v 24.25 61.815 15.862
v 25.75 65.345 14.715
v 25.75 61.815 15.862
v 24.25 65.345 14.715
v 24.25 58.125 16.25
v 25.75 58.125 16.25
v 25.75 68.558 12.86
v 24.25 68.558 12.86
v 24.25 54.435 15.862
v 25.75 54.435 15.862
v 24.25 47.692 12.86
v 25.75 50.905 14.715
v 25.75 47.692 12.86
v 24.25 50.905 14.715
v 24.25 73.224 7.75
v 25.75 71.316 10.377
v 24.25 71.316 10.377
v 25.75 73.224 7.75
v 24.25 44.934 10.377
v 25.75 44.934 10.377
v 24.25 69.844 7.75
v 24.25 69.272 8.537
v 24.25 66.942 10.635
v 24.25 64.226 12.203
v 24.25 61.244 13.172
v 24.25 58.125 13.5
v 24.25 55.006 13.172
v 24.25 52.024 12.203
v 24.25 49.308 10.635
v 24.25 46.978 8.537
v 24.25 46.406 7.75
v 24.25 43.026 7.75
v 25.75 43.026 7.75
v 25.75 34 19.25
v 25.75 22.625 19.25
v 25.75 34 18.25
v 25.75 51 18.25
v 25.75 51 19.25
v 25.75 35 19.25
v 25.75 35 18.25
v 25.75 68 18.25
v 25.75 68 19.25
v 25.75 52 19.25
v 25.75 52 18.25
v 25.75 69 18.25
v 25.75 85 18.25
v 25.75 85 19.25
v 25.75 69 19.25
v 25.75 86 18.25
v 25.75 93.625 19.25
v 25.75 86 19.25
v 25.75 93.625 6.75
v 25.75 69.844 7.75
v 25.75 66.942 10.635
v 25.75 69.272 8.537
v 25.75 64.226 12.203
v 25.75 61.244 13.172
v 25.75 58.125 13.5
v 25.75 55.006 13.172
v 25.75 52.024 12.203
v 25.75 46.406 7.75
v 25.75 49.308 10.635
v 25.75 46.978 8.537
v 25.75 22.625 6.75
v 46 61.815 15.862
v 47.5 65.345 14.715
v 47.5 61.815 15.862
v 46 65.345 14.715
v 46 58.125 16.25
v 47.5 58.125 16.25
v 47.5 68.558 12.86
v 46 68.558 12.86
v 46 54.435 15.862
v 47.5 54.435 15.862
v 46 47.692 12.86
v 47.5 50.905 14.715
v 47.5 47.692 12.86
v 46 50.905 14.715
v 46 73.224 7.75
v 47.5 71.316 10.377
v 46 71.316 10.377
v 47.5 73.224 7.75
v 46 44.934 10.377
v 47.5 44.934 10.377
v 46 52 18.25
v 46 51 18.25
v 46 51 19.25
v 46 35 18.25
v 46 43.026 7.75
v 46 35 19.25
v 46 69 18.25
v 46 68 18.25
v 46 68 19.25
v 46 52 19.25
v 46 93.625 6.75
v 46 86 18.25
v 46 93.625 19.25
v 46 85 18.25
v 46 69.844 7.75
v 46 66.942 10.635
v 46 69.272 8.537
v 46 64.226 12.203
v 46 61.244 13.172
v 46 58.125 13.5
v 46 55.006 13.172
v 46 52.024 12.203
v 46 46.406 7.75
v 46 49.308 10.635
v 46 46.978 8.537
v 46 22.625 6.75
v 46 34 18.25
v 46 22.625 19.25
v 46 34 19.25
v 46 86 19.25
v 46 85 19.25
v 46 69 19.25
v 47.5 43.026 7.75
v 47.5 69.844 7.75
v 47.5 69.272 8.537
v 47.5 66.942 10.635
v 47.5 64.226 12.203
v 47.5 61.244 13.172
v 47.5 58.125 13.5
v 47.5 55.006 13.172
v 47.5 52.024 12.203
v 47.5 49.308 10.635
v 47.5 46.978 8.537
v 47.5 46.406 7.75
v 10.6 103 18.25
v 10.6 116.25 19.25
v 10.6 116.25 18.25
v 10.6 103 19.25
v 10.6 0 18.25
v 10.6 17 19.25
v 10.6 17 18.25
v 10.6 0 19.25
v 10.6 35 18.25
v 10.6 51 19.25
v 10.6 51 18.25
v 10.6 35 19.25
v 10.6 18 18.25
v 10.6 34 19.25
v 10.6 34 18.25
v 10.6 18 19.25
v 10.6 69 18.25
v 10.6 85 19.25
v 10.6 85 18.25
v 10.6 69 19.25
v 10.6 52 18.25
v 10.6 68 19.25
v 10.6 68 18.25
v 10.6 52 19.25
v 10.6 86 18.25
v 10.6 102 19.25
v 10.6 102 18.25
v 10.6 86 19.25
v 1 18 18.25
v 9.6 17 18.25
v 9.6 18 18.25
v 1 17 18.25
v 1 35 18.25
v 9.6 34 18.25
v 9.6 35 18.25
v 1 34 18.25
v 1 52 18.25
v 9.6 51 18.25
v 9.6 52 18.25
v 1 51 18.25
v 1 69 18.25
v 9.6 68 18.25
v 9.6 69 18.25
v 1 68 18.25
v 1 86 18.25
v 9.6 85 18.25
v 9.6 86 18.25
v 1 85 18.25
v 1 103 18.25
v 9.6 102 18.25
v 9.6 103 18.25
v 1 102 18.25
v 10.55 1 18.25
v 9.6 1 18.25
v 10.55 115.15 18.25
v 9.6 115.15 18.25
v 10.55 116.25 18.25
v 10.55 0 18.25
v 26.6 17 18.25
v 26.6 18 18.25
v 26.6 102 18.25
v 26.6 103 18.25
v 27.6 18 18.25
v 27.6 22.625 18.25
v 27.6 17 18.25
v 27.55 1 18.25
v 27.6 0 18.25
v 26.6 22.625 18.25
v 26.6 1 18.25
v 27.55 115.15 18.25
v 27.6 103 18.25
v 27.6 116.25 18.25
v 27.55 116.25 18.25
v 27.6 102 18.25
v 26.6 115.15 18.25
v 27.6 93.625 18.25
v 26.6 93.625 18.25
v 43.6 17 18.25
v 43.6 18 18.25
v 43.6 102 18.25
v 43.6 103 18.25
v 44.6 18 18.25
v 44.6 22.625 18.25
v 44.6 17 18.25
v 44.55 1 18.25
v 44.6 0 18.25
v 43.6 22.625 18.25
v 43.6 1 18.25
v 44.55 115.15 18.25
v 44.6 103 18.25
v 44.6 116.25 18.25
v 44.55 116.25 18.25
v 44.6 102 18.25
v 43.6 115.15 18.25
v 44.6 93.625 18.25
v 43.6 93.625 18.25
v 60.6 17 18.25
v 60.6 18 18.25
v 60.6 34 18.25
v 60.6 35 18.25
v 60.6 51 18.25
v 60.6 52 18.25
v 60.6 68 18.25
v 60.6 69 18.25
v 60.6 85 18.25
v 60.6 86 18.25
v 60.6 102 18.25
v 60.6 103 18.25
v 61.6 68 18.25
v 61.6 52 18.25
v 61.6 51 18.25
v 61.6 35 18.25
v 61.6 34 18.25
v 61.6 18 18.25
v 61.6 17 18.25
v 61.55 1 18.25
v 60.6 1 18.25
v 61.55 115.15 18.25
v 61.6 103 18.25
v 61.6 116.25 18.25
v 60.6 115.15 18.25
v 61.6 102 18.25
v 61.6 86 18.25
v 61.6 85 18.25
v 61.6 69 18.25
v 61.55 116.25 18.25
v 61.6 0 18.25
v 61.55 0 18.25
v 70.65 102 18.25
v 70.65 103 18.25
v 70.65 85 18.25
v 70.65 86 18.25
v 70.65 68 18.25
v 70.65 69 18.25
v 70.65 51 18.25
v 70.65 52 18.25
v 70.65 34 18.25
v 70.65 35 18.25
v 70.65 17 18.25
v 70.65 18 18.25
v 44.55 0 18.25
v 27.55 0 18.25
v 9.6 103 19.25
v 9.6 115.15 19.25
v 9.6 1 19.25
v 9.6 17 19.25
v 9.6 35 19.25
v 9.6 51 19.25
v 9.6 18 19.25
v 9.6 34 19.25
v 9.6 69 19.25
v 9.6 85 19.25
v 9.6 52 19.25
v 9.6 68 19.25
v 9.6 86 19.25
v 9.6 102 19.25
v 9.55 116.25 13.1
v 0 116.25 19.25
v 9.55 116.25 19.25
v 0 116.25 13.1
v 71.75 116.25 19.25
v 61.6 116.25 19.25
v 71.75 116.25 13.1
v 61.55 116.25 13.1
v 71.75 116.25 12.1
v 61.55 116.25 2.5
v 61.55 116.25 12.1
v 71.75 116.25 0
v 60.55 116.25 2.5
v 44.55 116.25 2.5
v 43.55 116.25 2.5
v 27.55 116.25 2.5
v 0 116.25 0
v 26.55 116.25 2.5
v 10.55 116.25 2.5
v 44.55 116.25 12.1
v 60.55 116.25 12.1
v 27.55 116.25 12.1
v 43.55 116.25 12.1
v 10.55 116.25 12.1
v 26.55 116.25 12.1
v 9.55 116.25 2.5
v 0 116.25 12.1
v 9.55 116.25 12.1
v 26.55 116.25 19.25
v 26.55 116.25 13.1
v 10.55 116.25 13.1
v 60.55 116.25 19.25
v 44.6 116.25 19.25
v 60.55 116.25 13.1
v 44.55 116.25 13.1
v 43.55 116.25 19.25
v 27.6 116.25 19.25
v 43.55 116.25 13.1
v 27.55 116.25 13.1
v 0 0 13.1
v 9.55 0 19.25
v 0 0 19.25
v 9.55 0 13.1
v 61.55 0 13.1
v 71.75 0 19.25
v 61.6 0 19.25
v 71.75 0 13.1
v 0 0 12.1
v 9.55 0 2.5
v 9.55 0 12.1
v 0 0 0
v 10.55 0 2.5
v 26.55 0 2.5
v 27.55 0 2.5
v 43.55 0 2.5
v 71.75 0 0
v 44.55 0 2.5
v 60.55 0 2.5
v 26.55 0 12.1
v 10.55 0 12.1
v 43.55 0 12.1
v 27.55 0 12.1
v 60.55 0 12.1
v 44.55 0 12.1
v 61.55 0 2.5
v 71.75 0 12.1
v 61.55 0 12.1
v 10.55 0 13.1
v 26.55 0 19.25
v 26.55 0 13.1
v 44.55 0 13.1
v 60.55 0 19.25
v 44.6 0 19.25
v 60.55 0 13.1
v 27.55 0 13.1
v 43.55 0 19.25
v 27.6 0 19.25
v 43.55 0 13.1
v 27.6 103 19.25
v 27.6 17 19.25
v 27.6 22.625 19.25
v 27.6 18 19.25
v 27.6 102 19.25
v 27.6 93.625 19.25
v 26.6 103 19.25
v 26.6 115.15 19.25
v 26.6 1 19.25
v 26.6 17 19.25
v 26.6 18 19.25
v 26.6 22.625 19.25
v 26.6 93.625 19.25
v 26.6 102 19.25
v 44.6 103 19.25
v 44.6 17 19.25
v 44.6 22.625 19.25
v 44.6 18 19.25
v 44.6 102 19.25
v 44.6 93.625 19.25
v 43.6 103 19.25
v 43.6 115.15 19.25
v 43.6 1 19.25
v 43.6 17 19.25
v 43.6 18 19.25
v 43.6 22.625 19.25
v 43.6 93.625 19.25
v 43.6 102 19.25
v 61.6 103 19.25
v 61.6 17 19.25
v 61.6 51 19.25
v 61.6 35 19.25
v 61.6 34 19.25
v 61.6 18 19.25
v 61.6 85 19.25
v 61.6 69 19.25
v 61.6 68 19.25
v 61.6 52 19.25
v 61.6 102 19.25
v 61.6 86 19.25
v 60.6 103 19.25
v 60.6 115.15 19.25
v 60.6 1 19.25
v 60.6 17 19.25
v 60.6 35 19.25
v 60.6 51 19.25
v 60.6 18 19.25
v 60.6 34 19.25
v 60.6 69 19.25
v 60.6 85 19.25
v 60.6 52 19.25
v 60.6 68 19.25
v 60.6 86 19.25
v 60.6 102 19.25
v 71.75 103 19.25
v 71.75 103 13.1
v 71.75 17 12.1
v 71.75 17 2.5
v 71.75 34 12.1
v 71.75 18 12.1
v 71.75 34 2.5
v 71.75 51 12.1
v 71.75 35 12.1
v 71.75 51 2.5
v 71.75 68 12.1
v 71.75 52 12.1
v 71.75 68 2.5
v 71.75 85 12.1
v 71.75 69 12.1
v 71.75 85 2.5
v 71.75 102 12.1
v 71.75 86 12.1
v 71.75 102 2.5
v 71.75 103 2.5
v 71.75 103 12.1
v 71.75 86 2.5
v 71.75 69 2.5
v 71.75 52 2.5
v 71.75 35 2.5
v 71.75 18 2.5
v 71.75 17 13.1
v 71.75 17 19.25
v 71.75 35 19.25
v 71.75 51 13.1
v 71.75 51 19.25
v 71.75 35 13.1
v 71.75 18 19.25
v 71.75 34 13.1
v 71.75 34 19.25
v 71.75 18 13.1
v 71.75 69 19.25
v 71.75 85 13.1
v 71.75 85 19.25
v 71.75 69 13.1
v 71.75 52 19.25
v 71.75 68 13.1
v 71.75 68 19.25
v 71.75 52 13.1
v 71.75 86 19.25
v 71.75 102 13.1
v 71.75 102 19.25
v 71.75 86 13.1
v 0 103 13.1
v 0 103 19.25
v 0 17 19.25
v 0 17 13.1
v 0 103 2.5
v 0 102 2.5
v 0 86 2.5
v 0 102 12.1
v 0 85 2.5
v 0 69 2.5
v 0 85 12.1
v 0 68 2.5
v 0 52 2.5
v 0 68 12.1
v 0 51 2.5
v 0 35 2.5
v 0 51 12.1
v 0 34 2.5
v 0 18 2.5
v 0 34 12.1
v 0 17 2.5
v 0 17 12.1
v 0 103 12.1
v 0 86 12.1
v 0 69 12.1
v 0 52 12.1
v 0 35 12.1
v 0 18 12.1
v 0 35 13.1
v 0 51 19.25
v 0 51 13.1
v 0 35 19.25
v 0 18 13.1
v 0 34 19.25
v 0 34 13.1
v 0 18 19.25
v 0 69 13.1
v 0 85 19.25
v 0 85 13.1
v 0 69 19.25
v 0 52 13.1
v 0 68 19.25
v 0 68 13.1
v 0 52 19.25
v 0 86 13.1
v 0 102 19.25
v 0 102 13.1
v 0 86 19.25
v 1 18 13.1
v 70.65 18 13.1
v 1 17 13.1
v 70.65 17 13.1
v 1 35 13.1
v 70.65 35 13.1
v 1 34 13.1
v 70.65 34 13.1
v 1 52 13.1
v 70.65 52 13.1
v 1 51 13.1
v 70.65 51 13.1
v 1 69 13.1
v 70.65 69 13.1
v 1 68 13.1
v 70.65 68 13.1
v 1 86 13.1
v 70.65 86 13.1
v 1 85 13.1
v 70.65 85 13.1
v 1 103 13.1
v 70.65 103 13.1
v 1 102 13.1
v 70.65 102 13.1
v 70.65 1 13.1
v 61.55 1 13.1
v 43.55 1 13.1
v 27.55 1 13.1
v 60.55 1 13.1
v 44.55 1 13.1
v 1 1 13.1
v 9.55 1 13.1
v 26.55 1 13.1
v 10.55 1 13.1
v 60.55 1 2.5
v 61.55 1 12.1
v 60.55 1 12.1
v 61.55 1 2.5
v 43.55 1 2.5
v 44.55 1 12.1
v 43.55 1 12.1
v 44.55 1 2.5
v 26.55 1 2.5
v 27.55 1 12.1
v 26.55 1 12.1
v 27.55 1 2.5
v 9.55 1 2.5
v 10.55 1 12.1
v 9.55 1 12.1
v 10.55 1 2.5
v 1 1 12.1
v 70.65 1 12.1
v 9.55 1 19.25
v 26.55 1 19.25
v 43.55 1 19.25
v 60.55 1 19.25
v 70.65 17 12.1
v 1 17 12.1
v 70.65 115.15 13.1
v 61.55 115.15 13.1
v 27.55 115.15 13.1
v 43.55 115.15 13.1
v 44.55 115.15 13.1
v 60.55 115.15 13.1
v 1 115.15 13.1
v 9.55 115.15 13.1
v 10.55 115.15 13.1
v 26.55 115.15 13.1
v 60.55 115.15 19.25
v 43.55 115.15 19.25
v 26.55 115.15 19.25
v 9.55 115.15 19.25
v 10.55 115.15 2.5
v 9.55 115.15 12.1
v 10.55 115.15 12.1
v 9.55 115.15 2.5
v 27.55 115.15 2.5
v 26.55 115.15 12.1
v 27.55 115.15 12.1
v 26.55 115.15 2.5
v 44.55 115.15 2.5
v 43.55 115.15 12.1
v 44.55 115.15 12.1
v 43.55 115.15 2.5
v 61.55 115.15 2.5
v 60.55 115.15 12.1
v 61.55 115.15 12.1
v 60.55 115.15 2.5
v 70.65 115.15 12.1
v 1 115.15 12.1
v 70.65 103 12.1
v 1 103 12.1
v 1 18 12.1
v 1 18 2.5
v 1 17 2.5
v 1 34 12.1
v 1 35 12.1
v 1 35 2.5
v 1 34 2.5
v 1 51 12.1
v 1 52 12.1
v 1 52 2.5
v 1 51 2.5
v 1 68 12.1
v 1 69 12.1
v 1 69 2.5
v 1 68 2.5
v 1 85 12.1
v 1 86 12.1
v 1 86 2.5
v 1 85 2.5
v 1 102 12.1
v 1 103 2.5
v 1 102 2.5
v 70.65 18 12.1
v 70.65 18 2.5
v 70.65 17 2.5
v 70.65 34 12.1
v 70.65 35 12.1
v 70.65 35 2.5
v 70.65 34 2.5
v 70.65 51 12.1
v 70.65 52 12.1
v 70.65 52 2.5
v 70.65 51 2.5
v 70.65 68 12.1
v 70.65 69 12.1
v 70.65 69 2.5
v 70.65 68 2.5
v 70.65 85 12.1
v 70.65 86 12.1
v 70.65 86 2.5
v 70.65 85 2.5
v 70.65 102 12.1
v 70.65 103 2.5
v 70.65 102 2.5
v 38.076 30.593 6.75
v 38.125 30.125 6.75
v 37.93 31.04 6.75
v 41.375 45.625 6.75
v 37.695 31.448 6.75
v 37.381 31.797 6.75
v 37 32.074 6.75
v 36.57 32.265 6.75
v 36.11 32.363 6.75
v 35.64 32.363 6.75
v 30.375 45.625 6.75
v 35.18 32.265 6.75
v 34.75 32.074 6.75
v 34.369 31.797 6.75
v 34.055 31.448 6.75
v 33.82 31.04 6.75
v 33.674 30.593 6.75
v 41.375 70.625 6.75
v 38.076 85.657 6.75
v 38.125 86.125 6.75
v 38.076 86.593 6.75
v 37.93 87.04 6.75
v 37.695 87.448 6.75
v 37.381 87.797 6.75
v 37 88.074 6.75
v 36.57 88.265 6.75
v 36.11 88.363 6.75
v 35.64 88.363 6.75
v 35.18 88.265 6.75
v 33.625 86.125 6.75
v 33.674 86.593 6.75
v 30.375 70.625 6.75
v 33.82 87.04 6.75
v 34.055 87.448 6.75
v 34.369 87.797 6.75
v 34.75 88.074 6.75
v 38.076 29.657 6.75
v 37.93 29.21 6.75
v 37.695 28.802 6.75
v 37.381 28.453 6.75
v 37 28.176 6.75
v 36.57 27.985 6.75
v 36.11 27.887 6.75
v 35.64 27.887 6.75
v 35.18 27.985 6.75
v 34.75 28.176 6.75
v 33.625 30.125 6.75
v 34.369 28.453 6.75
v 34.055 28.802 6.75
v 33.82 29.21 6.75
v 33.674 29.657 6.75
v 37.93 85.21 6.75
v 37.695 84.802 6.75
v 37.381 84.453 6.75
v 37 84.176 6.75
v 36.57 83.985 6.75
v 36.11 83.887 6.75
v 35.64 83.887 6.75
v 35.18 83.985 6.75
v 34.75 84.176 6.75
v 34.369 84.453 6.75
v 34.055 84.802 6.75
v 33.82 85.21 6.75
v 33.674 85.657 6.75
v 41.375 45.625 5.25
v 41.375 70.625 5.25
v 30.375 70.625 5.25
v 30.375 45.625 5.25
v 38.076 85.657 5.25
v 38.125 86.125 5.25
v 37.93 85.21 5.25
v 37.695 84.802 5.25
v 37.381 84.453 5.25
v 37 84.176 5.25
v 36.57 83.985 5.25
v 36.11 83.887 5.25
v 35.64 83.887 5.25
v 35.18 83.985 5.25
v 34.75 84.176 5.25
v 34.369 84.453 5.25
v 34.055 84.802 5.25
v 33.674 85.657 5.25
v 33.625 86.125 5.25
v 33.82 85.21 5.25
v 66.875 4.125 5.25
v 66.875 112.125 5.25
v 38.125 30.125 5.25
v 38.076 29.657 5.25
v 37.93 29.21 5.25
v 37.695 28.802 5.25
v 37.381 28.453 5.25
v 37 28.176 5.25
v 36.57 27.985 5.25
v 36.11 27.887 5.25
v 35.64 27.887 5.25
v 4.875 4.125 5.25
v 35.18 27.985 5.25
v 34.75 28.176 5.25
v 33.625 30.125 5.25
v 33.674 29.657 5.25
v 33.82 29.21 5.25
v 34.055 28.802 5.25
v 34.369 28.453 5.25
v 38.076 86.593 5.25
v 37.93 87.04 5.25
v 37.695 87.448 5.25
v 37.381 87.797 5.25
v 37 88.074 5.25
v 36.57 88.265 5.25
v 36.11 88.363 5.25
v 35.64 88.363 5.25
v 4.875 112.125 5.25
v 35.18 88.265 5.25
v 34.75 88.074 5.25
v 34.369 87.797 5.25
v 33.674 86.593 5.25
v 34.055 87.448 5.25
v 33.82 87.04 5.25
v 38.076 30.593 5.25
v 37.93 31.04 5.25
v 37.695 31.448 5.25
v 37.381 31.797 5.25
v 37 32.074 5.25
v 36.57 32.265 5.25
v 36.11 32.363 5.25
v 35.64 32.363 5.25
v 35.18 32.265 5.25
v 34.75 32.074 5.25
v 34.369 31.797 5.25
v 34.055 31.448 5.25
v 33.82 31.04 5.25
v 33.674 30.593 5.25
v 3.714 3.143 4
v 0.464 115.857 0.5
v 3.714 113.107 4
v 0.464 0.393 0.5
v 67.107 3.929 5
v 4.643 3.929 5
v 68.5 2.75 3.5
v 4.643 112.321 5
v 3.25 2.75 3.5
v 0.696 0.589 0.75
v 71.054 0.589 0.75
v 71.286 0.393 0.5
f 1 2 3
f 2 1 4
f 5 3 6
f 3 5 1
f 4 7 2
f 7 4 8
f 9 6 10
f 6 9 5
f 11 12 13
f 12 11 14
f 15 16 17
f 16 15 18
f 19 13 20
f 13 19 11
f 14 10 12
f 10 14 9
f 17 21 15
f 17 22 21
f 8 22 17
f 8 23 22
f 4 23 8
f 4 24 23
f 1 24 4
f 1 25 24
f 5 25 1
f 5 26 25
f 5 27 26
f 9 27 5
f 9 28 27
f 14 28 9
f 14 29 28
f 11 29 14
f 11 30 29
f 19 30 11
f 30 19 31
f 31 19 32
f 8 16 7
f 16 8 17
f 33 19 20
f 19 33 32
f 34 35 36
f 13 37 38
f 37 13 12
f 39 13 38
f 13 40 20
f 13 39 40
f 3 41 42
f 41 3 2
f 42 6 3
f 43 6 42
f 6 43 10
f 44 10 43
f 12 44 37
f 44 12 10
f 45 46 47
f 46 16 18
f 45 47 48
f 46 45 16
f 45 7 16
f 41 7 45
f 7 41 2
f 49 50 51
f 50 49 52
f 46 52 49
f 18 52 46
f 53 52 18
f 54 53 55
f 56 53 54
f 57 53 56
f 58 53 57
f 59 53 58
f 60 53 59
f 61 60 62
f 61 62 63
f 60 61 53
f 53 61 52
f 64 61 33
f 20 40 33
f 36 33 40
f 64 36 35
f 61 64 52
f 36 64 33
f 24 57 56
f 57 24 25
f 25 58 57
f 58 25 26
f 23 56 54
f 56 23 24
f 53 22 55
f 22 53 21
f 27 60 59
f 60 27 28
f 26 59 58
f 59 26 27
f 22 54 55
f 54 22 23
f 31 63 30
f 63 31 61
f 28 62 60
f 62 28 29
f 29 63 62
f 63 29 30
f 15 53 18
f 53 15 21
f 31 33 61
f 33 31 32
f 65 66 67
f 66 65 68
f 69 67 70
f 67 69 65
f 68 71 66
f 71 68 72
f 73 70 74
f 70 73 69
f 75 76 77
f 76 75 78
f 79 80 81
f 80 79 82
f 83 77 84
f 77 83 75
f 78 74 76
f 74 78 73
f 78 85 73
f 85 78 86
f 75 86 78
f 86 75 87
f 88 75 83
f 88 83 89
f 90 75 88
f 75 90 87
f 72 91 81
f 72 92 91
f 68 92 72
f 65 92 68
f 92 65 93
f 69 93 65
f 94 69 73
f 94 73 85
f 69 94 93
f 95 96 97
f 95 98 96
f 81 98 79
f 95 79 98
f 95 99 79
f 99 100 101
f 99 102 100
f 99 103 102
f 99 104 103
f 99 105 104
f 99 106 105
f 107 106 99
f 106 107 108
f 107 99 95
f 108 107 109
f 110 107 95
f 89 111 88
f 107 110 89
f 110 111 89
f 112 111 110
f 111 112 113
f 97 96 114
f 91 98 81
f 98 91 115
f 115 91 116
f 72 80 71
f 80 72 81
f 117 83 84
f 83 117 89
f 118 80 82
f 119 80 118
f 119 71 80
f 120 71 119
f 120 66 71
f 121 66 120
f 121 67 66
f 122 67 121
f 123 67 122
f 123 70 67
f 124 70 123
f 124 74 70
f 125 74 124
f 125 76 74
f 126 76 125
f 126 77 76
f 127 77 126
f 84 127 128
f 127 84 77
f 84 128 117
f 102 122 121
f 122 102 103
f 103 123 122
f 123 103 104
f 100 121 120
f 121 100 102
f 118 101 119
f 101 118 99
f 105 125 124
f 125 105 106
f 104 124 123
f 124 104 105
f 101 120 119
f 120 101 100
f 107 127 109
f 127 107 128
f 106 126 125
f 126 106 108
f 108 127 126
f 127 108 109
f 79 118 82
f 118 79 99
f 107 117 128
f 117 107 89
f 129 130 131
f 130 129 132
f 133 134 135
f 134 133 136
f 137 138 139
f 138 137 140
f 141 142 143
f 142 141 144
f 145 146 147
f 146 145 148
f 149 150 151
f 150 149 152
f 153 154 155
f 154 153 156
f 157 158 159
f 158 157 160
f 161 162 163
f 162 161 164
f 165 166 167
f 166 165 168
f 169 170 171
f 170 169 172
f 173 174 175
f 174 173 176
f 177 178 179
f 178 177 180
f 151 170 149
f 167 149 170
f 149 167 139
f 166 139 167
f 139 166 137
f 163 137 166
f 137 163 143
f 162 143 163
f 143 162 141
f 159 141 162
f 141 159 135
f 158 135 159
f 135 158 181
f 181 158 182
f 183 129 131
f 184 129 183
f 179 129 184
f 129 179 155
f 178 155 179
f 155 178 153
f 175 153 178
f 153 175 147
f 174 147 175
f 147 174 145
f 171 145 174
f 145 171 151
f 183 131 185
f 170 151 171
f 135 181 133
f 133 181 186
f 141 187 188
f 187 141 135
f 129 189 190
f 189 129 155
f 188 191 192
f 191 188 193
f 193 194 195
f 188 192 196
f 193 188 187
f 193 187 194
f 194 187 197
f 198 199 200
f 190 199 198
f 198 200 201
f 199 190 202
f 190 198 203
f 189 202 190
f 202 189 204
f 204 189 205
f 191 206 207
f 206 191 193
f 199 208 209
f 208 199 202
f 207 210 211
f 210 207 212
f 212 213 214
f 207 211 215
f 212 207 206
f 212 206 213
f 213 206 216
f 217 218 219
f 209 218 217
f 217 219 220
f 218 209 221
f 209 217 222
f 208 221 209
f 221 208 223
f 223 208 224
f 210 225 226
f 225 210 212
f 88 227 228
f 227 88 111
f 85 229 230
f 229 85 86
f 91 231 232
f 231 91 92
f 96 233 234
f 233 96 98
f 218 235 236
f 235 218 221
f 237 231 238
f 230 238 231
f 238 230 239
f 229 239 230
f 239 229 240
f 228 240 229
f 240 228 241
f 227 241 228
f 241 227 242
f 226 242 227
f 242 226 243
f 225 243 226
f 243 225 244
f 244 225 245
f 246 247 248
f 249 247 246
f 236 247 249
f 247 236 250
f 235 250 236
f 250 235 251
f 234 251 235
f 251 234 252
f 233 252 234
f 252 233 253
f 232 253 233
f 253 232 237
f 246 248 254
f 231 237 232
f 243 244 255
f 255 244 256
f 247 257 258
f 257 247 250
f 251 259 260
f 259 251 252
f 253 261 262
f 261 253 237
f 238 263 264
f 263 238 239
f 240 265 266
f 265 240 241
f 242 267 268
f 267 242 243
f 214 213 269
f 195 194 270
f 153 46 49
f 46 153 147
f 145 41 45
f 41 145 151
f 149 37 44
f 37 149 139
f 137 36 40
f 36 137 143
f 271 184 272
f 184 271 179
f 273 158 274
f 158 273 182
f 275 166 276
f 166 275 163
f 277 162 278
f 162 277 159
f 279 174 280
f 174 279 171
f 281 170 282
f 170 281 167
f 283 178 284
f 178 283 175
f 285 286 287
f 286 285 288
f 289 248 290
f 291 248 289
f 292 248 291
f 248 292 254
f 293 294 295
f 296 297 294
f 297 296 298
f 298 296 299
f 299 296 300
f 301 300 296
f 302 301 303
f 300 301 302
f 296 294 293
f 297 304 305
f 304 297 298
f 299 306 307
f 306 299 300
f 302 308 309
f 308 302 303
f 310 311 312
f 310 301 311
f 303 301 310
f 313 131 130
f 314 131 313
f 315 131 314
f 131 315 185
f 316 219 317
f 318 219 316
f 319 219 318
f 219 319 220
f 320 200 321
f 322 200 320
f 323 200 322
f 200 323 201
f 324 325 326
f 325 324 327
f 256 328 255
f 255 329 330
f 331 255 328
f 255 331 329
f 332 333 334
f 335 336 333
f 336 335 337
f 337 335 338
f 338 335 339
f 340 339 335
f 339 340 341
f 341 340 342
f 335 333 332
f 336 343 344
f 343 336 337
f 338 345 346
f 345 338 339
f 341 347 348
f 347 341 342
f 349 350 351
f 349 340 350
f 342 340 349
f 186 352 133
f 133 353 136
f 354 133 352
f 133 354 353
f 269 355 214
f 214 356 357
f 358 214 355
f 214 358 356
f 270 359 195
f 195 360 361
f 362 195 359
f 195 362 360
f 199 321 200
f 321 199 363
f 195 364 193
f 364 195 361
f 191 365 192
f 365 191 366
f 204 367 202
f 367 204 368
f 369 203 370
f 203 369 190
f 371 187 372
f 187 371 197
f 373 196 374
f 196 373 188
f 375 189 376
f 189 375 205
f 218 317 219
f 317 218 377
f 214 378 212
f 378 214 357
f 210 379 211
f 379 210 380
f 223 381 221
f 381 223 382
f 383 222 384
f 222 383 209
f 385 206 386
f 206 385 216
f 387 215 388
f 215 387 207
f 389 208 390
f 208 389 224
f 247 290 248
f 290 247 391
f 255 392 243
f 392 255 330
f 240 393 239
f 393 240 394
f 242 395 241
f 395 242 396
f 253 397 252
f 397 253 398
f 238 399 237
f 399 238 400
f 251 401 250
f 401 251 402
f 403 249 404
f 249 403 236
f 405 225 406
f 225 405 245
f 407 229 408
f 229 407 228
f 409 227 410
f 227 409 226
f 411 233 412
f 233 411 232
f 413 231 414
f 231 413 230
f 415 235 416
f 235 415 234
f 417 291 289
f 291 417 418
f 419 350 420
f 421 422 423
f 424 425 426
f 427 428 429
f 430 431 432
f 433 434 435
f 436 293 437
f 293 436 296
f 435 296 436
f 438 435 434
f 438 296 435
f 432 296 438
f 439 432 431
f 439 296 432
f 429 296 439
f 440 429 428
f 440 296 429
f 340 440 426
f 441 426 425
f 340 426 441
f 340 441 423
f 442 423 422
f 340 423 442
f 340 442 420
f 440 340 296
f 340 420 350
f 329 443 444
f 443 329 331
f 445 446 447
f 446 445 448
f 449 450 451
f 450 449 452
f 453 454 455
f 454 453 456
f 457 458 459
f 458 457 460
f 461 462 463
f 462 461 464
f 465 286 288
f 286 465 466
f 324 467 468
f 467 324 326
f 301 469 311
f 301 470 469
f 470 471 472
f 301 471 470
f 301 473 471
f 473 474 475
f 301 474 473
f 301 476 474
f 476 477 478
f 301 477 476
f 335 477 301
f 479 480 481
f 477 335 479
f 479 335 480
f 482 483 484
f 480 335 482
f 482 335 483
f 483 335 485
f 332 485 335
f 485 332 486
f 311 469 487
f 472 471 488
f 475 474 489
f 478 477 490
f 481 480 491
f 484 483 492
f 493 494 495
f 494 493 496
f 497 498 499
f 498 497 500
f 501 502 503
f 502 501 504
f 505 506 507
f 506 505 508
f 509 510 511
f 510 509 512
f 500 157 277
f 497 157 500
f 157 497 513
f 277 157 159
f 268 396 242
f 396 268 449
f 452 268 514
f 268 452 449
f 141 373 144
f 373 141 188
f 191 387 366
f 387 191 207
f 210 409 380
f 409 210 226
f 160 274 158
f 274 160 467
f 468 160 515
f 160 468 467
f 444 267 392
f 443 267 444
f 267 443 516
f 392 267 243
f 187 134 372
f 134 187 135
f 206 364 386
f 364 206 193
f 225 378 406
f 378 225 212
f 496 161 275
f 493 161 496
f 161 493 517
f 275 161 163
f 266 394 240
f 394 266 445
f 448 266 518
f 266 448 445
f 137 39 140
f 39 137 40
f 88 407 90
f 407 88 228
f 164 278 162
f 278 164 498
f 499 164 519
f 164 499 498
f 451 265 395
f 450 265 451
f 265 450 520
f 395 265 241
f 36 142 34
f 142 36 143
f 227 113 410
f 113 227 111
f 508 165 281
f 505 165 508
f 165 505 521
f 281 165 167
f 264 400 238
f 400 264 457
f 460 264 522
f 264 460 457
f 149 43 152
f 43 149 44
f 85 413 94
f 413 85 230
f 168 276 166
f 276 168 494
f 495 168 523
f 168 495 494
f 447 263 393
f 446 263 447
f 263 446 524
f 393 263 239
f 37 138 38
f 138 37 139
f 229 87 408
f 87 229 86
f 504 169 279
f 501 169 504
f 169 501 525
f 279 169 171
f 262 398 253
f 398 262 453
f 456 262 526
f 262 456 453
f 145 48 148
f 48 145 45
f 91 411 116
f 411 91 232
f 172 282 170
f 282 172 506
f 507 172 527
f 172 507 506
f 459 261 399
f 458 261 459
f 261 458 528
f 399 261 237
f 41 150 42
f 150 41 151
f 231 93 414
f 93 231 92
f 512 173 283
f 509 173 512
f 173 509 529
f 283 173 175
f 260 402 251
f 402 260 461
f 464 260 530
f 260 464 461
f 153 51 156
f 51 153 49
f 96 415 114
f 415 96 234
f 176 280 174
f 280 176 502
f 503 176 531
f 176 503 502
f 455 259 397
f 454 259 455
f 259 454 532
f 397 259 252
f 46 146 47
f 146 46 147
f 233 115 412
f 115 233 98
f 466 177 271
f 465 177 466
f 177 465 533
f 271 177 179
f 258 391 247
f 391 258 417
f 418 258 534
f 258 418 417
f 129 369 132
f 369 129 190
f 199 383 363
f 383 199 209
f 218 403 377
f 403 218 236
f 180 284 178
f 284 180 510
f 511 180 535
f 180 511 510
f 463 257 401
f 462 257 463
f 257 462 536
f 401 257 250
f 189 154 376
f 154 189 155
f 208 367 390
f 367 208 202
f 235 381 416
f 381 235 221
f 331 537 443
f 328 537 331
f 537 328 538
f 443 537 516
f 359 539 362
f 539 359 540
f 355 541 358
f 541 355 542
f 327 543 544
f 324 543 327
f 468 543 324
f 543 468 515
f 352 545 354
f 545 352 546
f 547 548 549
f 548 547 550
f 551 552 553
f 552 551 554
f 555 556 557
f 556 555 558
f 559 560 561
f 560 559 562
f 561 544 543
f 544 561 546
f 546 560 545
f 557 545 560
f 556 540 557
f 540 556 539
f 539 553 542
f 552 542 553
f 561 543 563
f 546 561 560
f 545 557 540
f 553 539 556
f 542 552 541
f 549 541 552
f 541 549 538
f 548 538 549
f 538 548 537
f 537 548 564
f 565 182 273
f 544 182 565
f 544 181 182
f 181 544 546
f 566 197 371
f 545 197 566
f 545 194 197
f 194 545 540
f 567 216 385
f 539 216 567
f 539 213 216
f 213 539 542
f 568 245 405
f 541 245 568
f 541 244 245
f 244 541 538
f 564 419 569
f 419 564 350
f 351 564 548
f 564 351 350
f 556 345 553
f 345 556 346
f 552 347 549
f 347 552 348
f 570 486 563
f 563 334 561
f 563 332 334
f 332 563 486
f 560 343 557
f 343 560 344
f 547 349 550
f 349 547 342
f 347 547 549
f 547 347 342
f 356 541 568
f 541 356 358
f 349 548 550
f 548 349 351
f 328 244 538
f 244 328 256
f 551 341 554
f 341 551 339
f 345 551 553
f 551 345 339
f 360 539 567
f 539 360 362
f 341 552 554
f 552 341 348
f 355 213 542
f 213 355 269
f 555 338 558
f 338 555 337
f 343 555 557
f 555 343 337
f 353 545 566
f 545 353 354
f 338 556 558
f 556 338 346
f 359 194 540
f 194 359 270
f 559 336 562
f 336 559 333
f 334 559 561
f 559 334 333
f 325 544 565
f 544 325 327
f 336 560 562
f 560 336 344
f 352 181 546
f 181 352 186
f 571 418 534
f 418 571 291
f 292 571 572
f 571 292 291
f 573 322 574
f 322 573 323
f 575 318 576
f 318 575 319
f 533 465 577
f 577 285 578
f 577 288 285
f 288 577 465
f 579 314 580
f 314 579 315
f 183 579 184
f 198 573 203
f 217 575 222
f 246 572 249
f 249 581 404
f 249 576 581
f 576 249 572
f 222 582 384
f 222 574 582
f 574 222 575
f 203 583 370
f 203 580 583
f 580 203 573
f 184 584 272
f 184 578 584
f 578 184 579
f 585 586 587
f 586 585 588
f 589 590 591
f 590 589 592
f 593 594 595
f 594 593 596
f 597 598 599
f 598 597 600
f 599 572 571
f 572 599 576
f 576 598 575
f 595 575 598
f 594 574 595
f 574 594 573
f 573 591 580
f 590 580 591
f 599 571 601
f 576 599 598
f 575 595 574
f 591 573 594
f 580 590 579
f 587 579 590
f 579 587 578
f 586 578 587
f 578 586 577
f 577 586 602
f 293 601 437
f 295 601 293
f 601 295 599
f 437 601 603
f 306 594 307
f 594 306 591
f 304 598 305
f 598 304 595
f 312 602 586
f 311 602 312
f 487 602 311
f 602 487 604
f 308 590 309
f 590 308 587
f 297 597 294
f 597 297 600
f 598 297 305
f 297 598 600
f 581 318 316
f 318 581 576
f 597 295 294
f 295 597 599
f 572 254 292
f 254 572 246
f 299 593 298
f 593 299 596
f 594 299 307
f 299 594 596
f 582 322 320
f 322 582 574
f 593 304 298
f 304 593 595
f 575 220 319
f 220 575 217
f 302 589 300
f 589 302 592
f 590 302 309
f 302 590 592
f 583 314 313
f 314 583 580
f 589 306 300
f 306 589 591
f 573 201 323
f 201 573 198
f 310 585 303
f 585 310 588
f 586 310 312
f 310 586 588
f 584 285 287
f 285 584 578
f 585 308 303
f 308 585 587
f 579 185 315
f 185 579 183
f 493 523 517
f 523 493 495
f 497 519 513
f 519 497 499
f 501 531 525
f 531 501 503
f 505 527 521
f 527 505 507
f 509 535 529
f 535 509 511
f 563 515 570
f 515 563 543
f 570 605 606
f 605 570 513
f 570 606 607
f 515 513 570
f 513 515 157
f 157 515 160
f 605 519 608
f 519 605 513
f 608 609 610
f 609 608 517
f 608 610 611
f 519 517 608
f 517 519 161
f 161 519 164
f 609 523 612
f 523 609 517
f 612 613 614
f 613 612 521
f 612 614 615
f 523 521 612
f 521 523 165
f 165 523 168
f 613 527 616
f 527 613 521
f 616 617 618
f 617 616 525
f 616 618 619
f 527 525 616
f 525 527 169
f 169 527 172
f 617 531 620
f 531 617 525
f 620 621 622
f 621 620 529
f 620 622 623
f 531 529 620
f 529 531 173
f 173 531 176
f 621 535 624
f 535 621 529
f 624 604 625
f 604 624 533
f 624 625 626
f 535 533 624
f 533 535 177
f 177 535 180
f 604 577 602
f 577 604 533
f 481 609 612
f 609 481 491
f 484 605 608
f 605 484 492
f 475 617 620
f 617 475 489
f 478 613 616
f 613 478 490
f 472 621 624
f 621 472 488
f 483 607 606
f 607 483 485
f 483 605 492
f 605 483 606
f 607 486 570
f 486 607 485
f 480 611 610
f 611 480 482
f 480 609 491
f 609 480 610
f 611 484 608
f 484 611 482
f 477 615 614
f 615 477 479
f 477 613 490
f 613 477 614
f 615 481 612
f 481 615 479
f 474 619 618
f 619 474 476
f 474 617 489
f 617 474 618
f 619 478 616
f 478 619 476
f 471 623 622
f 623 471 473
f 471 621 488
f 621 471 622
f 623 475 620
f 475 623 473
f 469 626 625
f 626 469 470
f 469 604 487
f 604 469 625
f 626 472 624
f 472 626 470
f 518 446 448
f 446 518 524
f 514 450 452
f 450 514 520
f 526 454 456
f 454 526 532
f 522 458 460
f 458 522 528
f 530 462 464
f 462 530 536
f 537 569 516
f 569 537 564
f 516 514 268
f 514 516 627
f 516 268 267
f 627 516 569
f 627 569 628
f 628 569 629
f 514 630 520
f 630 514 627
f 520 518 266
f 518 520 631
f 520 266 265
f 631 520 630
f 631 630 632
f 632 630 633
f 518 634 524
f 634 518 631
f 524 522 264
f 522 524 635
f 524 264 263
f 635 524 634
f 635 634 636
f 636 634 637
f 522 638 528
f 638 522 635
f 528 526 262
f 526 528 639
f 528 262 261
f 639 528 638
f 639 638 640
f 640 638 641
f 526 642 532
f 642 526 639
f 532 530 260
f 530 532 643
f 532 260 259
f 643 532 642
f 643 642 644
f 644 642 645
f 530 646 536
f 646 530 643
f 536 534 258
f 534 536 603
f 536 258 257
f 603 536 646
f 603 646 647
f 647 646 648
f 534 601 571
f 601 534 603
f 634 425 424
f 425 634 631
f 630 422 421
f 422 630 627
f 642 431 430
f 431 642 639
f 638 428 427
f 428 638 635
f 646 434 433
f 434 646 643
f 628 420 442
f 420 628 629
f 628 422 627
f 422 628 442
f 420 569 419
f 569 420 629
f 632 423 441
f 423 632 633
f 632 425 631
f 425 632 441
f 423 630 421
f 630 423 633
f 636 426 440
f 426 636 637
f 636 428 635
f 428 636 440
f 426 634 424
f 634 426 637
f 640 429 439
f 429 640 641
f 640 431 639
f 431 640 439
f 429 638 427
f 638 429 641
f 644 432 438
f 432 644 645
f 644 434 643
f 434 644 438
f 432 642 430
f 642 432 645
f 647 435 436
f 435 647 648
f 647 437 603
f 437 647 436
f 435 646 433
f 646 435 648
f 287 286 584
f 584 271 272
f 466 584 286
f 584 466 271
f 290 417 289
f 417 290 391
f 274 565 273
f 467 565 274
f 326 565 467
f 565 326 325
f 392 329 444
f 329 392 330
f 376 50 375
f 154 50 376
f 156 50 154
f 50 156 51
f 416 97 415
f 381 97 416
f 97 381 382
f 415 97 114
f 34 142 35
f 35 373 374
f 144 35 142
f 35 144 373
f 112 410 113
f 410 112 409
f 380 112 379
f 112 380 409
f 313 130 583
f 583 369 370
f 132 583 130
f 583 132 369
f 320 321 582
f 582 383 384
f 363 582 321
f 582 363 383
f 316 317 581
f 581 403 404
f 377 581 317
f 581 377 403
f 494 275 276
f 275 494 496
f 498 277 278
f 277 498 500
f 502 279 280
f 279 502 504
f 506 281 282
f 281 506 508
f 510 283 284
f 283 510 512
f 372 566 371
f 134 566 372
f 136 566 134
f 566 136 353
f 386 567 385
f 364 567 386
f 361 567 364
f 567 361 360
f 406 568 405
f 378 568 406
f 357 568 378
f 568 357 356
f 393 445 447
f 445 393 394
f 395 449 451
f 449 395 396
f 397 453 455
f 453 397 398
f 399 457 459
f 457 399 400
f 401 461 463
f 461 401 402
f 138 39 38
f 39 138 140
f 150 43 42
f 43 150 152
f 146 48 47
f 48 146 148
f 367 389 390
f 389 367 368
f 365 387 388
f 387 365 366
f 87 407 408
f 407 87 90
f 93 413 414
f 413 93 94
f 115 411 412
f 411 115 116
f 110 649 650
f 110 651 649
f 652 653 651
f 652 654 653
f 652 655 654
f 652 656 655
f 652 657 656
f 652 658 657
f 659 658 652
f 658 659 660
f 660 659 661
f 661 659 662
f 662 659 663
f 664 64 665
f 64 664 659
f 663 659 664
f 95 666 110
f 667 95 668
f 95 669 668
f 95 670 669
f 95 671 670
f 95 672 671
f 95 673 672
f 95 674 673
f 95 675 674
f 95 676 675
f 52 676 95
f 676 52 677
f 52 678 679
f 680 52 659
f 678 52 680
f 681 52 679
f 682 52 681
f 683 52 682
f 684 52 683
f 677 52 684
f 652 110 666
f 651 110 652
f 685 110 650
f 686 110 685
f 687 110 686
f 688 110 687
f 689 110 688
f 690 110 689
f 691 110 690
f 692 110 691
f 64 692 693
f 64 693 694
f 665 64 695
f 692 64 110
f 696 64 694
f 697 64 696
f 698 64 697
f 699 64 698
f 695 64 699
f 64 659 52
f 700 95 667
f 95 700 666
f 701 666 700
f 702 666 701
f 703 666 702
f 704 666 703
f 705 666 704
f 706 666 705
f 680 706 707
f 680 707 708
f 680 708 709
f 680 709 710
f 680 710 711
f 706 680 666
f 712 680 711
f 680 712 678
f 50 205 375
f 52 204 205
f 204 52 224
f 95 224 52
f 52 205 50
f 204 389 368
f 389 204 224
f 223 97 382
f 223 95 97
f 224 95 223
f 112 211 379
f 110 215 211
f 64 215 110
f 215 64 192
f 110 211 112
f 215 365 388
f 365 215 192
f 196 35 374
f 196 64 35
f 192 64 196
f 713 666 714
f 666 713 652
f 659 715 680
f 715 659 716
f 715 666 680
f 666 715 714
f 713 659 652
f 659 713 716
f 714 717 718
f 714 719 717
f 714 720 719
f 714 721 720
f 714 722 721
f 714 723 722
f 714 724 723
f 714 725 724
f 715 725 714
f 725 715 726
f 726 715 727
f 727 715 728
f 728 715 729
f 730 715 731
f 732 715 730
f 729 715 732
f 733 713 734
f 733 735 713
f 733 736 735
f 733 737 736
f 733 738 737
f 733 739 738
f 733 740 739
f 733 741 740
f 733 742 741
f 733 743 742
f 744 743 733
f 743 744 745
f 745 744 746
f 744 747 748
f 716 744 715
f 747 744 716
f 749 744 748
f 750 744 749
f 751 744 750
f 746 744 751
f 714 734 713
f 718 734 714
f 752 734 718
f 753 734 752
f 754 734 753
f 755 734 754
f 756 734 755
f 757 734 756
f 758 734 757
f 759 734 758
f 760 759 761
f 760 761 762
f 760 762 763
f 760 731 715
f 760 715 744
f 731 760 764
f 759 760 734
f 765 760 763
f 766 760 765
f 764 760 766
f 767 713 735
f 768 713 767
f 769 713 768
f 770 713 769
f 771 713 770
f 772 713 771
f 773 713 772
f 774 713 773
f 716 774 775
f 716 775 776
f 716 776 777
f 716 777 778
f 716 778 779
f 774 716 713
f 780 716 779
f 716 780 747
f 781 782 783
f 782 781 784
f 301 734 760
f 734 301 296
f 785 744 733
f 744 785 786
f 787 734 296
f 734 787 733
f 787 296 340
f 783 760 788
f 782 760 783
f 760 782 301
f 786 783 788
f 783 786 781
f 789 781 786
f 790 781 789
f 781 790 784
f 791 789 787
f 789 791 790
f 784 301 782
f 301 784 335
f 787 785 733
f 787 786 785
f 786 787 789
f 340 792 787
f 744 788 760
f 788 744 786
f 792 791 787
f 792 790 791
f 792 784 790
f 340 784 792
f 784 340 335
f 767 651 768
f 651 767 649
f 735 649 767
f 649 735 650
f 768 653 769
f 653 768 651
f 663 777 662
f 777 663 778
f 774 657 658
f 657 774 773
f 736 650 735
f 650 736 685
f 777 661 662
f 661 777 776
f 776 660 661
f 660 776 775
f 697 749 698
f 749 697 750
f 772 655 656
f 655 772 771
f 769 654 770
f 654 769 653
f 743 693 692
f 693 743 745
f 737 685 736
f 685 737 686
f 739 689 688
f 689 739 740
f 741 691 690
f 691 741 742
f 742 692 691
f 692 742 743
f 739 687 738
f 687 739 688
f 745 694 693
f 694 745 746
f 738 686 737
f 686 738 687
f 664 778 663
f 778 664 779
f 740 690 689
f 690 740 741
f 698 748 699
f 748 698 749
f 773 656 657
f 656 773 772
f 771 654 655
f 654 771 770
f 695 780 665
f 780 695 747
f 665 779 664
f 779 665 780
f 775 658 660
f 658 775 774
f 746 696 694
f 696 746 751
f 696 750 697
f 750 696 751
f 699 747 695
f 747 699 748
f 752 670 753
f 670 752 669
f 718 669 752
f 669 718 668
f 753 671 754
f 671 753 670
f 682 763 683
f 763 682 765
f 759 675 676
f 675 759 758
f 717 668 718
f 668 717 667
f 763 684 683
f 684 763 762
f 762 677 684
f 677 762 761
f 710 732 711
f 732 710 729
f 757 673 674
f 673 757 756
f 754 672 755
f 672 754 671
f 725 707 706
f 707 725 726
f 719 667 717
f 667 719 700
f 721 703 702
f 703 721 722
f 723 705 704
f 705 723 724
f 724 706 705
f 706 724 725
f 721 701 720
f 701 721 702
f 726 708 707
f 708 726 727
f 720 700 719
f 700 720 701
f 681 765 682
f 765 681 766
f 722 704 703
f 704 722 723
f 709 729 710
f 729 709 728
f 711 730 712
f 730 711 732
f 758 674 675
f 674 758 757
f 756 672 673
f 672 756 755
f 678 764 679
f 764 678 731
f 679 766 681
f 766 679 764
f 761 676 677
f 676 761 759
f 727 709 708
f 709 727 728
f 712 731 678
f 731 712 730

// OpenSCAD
$fs = 0.4;

cover_width = 71.75;
cover_height = 116.25;
cover_depth = 19.25;

inset_width = 20.25;
inset_height = 71;
inset_depth = 12.5;

switch_width = 11;
switch_height = 25;

plate_width = 62;
plate_height = 108;
plate_depth = 5.25;

hole_diameter = 4.5;
hole_to_switch = 15.5;

brick_size = 16;
mortar_size = 1;
brick_x_offset = 9.6;
brick_z_offset = -3;

slot_length = 37;
slot_width = 5.5;
slot_depth = 1.5;
slot_source_diameter = 30;
slot_from_top = 3;
slot_from_bottom = 1;

// These messages are visible in Carve's Compilation log. Change a dimension
// to an invalid value to see the assertion and its source line.
echo("Plate dimensions", width = cover_width, height = cover_height, depth = cover_depth);
assert(cover_width > 0 && cover_height > 0 && cover_depth > 0,
       "Cover dimensions must all be greater than zero");
assert(inset_width < cover_width && inset_height < cover_height,
       "The inset must fit inside the cover");

module hole() {
    translate([
        cover_width / 2, 
        ((cover_height - switch_height) / 2) - hole_to_switch, 
        0
    ])
        cylinder(cover_depth, hole_diameter / 2, hole_diameter / 2);
}

module slot() {
    slot_radius = (slot_width + slot_source_diameter) / 2;
    slot_bounds_height = (inset_depth - slot_from_top - slot_from_bottom);

    translate([
        (cover_width - inset_width) / 2, 
        (cover_height - 2 * slot_radius) / 2, 
        -slot_radius + slot_bounds_height + cover_depth 
            - inset_depth + slot_from_bottom
    ]) {
        rotate([0, -90, 0]) {
            difference() {
                translate([0, slot_radius, 0]) {
                    difference() {
                        cylinder(
                            slot_depth, 
                            d = slot_radius * 2,
                            center = false
                        );
                        cylinder(slot_depth, d = slot_source_diameter);
                    }
                }
                
                translate([-slot_radius, 0, 0])
                    cube([
                            2 * slot_radius - slot_bounds_height, 
                            slot_radius * 2,
                            slot_radius * 2
                    ]);    
            }
        }
    }
}

module brick_lines() {
    translate([brick_x_offset, 0, 0]) {
        cols = floor(cover_width / (brick_size + mortar_size));
        
        for (i = [0 : 3]) {
            translate([i * (brick_size + mortar_size), 0, 0])
                cube([mortar_size, cover_height, mortar_size + .1]);
        }
    }
        
    rows = floor(cover_height / (brick_size + mortar_size));
    
    for (i = [1 : rows]) {
        translate([0, i * (brick_size + mortar_size), 0])
            cube([cover_width, mortar_size, mortar_size + .1]);
    }
}

color("grey") {
    difference() {
        cube([cover_width, cover_height, cover_depth]);
        
        translate([
            (cover_width - inset_width) / 2, 
            (cover_height - inset_height) / 2, 
            cover_depth - inset_depth
        ])
            cube([inset_width, inset_height, inset_depth]);
        
        translate([
            (cover_width - switch_width) / 2, 
            (cover_height - switch_height) / 2, 
            0
        ])
            cube([switch_width, switch_height, cover_depth]);
            
        translate([cover_width / 2, cover_height / 2])
            linear_extrude(
                height = plate_depth,
                scale = [
                    plate_width / cover_width,
                    plate_height / cover_height
                ]
            )
                square([cover_width, cover_height], center = true);

        hole();
            
        translate([0, 2 * hole_to_switch + switch_height, 0]) hole();

        slot();
        translate([inset_width + slot_depth, 0, 0]) slot();

        translate([0, 0, cover_depth - mortar_size]) brick_lines();


    // These seem more logical, but don't z-offset consistent with the original
    //    translate([0, mortar_size, (-brick_size / 2) - brick_z_offset]) 
    //        rotate([90, 0, 0]) brick_lines();   
    //
    //    translate([0, cover_height, (-brick_size / 2) - brick_z_offset]) 
    //        rotate([90, 0, 0]) brick_lines();
    // 

        translate([
            2 * mortar_size + cover_width + brick_x_offset / 2, 
            mortar_size, 
            (-mortar_size / 2) - brick_z_offset
        ]) 
            rotate([0, -90, 90]) brick_lines();   

        translate([
            2 * mortar_size + cover_width + brick_x_offset / 2, 
            cover_height, 
            (-mortar_size / 2) - brick_z_offset
        ]) 
            rotate([0, -90, 90]) brick_lines();   

        translate([mortar_size, 0, (-mortar_size / 2) - brick_z_offset]) 
            rotate([0, -90, 0]) brick_lines();   

        translate([cover_width, 0, (-mortar_size / 2) - brick_z_offset]) 
            rotate([0, -90, 0]) brick_lines();       
    }
}
